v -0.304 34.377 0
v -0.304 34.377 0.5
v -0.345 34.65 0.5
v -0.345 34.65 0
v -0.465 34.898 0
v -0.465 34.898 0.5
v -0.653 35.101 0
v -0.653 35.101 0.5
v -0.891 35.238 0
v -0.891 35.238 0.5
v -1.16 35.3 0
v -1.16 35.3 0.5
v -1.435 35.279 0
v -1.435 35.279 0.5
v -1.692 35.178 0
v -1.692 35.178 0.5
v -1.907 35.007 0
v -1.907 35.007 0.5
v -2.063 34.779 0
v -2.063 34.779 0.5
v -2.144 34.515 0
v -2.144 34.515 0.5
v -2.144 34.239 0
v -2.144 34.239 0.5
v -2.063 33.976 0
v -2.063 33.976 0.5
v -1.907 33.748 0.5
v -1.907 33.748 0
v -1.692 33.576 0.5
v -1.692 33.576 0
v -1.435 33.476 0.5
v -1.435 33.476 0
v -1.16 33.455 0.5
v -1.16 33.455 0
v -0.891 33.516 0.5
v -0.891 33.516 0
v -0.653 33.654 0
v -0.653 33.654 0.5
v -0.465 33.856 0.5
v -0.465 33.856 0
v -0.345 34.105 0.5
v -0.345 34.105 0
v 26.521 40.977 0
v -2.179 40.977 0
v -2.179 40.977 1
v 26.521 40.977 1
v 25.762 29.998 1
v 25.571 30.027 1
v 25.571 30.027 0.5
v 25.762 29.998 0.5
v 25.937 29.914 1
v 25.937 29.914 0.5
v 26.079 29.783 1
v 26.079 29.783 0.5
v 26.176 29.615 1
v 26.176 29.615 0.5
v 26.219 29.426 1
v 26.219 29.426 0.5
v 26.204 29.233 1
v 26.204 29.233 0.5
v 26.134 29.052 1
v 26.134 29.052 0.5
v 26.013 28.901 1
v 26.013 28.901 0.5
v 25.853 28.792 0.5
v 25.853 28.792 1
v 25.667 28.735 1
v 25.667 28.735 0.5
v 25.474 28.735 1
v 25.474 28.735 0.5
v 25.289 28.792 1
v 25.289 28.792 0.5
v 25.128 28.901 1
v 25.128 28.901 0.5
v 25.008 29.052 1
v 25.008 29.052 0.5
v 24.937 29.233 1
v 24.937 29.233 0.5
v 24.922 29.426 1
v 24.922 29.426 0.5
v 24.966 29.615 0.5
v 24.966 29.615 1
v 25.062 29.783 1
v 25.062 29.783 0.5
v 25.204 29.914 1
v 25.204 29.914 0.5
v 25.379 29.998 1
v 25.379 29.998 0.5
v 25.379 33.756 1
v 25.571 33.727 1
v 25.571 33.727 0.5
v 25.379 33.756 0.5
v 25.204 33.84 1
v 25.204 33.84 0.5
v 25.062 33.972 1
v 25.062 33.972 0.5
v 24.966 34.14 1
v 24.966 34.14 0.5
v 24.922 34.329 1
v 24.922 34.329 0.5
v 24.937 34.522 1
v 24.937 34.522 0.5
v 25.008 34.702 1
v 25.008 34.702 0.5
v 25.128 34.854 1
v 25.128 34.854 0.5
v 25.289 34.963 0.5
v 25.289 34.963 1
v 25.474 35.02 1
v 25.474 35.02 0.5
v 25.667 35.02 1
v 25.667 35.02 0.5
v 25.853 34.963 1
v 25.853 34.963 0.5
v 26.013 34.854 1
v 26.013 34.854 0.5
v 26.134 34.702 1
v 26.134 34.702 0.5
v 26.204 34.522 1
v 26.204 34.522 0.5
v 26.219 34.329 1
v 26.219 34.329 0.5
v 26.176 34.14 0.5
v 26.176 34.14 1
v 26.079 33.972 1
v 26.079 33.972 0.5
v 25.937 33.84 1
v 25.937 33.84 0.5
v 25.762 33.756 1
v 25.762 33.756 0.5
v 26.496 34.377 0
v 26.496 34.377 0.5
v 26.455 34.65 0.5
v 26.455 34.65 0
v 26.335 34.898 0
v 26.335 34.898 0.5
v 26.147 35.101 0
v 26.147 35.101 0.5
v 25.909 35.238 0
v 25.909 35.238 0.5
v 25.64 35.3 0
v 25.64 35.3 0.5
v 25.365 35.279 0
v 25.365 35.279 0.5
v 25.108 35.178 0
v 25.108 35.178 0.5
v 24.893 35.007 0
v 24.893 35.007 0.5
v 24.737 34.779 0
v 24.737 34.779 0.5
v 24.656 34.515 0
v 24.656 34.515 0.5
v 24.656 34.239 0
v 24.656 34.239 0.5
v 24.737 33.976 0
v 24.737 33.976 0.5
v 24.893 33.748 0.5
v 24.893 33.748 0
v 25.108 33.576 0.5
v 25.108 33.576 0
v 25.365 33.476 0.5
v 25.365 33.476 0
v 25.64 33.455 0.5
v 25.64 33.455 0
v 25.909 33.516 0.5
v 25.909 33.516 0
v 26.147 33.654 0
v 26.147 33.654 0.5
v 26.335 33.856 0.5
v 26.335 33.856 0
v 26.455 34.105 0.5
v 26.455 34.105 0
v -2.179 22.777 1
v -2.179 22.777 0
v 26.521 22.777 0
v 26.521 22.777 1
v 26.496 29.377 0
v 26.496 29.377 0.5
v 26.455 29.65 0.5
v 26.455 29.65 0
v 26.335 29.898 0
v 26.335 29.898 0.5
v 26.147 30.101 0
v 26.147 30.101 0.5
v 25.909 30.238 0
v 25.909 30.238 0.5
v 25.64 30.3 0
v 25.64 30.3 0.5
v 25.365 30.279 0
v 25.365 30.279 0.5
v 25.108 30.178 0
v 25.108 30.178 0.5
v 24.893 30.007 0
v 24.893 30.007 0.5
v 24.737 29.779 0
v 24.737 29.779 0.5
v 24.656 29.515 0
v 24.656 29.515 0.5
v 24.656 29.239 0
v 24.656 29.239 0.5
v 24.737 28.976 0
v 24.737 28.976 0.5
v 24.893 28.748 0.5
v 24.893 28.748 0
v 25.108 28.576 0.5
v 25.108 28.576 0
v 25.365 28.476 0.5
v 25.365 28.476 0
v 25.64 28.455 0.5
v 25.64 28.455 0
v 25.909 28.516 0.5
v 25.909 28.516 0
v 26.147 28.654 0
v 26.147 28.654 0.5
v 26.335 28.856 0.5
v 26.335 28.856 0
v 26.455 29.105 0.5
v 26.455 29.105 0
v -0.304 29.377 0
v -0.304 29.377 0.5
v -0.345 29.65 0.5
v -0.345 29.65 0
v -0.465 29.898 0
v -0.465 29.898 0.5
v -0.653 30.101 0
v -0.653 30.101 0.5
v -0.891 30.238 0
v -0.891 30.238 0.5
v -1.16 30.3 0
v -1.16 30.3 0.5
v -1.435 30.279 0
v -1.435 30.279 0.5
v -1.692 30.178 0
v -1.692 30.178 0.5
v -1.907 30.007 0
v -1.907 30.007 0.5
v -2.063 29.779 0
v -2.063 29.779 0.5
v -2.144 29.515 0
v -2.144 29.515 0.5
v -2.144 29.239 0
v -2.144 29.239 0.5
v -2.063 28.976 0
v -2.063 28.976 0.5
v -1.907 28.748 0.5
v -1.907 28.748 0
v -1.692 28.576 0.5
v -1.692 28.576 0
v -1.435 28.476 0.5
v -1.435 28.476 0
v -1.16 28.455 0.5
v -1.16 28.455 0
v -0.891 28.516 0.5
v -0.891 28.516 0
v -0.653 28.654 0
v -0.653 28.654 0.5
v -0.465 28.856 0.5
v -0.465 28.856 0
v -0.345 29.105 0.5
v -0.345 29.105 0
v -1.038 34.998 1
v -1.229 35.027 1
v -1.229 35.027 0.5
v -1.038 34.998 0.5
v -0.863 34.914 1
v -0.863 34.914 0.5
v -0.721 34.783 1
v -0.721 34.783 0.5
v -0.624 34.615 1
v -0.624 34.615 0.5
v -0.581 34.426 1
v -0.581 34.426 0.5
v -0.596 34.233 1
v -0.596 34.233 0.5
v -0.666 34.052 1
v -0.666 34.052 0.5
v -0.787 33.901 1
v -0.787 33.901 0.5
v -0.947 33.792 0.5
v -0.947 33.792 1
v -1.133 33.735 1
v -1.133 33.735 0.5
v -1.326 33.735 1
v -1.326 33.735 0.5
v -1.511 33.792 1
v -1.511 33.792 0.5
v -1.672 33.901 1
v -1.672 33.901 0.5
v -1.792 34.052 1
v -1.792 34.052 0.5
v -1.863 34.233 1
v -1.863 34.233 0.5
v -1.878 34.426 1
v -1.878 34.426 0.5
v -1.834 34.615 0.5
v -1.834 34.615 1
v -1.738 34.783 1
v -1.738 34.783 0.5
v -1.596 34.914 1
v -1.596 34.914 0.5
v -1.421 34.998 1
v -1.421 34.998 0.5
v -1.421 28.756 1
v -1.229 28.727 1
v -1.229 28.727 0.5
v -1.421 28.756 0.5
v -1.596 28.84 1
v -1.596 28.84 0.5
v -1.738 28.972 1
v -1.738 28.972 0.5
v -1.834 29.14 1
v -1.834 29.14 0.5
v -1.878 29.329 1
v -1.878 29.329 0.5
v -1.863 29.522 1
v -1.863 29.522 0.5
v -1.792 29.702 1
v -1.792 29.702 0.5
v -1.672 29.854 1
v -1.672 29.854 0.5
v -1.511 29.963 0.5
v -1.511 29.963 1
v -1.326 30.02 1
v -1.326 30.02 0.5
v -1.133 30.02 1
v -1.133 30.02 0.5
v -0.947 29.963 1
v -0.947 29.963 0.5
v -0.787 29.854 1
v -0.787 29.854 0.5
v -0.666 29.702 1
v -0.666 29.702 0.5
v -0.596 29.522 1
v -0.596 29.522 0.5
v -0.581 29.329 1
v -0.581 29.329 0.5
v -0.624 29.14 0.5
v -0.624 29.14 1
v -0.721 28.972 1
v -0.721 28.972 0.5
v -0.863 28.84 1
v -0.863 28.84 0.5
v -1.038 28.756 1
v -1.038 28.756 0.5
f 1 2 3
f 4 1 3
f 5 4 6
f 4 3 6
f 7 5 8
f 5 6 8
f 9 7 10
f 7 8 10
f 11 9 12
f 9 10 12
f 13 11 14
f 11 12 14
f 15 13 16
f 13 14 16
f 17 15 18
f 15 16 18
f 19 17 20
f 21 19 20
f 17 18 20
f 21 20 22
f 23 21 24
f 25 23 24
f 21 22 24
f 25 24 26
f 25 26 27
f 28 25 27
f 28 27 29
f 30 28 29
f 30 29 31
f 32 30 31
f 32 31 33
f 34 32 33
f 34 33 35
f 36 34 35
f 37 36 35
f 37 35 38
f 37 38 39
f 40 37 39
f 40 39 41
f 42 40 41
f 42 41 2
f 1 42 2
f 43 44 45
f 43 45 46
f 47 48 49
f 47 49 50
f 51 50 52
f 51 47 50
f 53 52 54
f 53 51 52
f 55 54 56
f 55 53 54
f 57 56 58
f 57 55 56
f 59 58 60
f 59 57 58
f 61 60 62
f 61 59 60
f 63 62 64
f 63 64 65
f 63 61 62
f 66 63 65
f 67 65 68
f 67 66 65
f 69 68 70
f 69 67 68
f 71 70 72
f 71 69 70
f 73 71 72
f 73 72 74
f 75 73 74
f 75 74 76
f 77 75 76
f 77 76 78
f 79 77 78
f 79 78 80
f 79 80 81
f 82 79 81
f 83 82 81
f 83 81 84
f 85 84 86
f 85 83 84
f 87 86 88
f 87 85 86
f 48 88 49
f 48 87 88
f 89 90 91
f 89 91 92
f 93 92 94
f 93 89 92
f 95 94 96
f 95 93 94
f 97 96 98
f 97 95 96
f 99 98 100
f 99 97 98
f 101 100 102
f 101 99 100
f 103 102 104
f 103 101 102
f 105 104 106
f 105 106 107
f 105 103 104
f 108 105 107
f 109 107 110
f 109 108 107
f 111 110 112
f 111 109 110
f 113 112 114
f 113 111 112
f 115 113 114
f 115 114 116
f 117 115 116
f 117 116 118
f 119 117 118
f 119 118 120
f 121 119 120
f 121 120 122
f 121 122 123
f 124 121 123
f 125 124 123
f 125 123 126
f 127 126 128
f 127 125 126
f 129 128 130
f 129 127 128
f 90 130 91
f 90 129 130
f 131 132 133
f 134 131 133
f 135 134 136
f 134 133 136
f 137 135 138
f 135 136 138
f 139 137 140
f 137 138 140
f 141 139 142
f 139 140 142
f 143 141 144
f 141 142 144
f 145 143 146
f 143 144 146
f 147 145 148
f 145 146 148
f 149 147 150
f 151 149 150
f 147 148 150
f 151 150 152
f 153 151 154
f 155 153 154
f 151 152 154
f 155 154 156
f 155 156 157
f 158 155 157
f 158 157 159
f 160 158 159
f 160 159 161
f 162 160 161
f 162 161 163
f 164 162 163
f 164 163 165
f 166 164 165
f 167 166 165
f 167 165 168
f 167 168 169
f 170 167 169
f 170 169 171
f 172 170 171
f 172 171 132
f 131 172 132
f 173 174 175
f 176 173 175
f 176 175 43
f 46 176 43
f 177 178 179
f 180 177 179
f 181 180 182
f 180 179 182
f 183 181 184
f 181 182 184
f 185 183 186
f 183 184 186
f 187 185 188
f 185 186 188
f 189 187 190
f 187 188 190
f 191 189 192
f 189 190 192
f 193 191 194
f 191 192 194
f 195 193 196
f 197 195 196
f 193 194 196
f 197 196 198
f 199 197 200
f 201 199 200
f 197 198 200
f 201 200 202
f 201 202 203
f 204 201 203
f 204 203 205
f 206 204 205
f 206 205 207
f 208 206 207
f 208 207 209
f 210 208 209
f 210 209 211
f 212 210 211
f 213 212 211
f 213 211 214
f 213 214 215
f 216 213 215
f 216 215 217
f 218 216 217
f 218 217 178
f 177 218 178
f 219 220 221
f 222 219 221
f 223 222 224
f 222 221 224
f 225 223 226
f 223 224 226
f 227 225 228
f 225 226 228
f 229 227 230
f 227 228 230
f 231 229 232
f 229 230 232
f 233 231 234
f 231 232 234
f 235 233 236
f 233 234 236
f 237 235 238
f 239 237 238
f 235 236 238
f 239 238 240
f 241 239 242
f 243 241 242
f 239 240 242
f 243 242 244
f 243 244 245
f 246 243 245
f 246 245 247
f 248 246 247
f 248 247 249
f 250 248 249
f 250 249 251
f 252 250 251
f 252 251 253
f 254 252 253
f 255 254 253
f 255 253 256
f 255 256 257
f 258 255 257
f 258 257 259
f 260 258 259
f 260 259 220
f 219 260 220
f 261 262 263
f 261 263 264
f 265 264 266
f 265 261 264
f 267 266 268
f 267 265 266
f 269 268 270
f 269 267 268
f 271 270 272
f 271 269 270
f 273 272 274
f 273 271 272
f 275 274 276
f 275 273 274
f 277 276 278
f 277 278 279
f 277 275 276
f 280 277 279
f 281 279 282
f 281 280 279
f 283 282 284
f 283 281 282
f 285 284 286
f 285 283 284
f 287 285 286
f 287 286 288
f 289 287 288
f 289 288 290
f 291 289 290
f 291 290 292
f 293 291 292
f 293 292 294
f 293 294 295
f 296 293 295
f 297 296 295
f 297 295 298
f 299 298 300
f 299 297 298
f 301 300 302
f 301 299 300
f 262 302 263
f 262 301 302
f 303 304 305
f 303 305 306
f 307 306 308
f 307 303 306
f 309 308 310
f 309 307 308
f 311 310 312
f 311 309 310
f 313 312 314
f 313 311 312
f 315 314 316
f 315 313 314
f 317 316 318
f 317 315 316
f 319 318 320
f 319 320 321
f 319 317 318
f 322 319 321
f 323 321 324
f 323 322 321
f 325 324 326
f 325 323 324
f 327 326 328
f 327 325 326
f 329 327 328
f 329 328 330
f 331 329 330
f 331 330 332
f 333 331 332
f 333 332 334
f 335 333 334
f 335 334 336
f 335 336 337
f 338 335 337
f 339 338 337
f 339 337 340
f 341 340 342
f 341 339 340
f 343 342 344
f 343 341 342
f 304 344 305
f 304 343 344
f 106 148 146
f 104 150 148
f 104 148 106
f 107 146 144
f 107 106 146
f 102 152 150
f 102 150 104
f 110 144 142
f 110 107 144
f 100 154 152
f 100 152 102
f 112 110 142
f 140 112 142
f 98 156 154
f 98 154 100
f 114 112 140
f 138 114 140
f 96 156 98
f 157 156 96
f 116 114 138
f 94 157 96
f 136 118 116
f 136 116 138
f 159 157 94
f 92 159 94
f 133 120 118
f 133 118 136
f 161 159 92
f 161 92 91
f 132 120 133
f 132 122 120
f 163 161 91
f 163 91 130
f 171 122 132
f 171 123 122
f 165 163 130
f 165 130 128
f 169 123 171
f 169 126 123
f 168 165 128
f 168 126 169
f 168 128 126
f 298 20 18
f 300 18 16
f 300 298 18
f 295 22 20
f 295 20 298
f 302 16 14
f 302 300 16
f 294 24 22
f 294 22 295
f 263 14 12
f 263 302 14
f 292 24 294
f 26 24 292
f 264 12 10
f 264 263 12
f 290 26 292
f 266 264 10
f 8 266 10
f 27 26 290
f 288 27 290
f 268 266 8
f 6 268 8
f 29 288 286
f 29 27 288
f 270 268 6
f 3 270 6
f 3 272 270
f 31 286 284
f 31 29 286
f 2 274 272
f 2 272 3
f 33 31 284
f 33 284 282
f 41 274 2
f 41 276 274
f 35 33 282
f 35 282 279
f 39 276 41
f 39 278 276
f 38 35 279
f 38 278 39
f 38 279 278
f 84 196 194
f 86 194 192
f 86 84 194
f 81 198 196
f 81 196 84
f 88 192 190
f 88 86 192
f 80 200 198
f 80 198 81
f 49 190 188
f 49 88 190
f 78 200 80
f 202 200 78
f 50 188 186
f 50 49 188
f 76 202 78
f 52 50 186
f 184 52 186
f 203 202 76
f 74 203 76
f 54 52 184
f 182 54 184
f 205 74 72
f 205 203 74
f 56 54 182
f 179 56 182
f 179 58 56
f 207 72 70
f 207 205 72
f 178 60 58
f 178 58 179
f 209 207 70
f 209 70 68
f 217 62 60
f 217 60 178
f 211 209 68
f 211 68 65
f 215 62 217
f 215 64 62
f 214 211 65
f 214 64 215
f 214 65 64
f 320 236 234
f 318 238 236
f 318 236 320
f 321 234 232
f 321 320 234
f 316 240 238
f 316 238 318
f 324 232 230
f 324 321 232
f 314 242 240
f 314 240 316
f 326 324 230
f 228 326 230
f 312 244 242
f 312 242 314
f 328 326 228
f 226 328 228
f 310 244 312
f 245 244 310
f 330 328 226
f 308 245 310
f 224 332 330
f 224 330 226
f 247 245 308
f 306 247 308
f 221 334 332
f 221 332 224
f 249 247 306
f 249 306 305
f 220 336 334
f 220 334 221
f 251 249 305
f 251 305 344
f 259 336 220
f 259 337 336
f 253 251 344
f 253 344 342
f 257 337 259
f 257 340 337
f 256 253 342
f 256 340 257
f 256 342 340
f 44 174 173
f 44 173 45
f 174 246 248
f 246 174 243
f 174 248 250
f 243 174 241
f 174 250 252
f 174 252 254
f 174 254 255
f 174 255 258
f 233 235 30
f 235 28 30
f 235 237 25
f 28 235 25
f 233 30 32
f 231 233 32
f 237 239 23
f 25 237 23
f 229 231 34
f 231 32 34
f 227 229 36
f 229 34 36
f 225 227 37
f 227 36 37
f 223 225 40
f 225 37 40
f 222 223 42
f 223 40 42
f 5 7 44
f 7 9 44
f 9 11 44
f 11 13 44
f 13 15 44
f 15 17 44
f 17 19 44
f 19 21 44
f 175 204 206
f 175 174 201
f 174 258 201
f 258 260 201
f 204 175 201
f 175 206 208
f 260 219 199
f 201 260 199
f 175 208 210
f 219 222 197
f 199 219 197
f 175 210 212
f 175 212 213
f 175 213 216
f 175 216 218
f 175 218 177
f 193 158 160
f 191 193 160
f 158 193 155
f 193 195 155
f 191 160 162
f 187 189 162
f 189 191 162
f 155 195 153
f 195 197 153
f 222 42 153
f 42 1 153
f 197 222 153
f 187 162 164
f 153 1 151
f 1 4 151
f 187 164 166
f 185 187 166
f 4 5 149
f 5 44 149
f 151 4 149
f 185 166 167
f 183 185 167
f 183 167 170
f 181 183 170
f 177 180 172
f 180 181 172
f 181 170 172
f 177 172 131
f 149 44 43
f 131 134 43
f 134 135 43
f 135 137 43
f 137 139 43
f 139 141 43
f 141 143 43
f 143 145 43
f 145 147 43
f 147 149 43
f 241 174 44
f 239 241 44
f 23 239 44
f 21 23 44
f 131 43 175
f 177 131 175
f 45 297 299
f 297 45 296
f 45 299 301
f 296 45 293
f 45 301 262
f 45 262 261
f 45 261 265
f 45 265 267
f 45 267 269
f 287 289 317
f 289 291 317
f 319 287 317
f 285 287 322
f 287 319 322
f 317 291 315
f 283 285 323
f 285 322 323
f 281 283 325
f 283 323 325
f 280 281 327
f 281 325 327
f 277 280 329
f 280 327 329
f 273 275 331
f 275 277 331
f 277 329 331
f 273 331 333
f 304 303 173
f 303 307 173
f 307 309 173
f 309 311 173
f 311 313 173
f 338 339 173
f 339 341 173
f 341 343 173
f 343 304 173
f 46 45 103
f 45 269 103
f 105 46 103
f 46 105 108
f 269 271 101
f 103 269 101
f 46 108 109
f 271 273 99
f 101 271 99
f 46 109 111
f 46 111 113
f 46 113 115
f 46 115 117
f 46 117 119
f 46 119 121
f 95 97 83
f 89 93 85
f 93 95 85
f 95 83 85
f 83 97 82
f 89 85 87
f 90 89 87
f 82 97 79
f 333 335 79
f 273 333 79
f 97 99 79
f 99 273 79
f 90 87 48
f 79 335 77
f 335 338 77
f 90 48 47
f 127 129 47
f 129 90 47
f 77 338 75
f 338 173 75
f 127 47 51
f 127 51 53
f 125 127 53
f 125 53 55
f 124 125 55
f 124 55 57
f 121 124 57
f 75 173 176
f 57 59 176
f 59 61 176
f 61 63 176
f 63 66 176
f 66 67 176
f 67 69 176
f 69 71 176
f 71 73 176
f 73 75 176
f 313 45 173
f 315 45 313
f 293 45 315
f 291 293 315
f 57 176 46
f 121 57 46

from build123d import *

# Parameters (mm, degrees)
SKETCH_1_W          = 28.7
SKETCH_1_H          = 18.2
EXTRUDE_1_DEPTH     = 1
SKETCH_2_R          = 0.925
CUT_EXTRUDE_1_DEPTH = 49.82096668
SKETCH_3_R          = 0.925
SKETCH_3_R_2        = 0.65
EXTRUDE_2_DEPTH     = 0.5


with BuildPart() as part:
    # 草圖1 → 填料-伸長1 (new body)
    with BuildSketch(Plane.XY):
        with Locations((12.170607589, 31.877361563)):
            Rectangle(SKETCH_1_W, SKETCH_1_H)
    extrude(amount=EXTRUDE_1_DEPTH)

    # 草圖2 → 除料-伸長1 (cut, through all)
    with BuildSketch(Plane.XY.offset(1)):
        with Locations((25.570607589, 34.377361563)):
            Circle(SKETCH_2_R)
        with Locations((25.570607589, 29.377361563)):
            Circle(SKETCH_2_R)
        with Locations((-1.229392411, 34.377361563)):
            Circle(SKETCH_2_R)
        with Locations((-1.229392411, 29.377361563)):
            Circle(SKETCH_2_R)
    extrude(amount=-CUT_EXTRUDE_1_DEPTH, mode=Mode.SUBTRACT)

    # 草圖3 → 填料-伸長2 (add)
    # profile 1 of 4: a face of its own
    with BuildSketch(Plane(origin=(0, 0, 1), x_dir=(-1, 0, 0), z_dir=(0, 0, -1))):
        with Locations(Location((1.229392411, 34.377361563, 0), (0, 0, 180))):
            Circle(SKETCH_3_R)
        with Locations(Location((1.229392411, 34.377361563, 0), (0, 0, 90))):
            Circle(SKETCH_3_R_2, mode=Mode.SUBTRACT)
    # profile 2 of 4: a face of its own
    with BuildSketch(Plane(origin=(0, 0, 1), x_dir=(-1, 0, 0), z_dir=(0, 0, -1))):
        with Locations(Location((1.229392411, 29.377361563, 0), (0, 0, 180))):
            Circle(SKETCH_3_R)
        with Locations(Location((1.229392411, 29.377361563, 0), (0, 0, 270))):
            Circle(SKETCH_3_R_2, mode=Mode.SUBTRACT)
    # profile 3 of 4: a face of its own
    with BuildSketch(Plane(origin=(0, 0, 1), x_dir=(-1, 0, 0), z_dir=(0, 0, -1))):
        with Locations(Location((-25.570607589, 29.377361563, 0), (0, 0, 180))):
            Circle(SKETCH_3_R)
        with Locations(Location((-25.570607589, 29.377361563, 0), (0, 0, 90))):
            Circle(SKETCH_3_R_2, mode=Mode.SUBTRACT)
    # profile 4 of 4: a face of its own
    with BuildSketch(Plane(origin=(0, 0, 1), x_dir=(-1, 0, 0), z_dir=(0, 0, -1))):
        with Locations(Location((-25.570607589, 34.377361563, 0), (0, 0, 180))):
            Circle(SKETCH_3_R)
        with Locations(Location((-25.570607589, 34.377361563, 0), (0, 0, 270))):
            Circle(SKETCH_3_R_2, mode=Mode.SUBTRACT)
    extrude(amount=EXTRUDE_2_DEPTH)


solid = part.part
